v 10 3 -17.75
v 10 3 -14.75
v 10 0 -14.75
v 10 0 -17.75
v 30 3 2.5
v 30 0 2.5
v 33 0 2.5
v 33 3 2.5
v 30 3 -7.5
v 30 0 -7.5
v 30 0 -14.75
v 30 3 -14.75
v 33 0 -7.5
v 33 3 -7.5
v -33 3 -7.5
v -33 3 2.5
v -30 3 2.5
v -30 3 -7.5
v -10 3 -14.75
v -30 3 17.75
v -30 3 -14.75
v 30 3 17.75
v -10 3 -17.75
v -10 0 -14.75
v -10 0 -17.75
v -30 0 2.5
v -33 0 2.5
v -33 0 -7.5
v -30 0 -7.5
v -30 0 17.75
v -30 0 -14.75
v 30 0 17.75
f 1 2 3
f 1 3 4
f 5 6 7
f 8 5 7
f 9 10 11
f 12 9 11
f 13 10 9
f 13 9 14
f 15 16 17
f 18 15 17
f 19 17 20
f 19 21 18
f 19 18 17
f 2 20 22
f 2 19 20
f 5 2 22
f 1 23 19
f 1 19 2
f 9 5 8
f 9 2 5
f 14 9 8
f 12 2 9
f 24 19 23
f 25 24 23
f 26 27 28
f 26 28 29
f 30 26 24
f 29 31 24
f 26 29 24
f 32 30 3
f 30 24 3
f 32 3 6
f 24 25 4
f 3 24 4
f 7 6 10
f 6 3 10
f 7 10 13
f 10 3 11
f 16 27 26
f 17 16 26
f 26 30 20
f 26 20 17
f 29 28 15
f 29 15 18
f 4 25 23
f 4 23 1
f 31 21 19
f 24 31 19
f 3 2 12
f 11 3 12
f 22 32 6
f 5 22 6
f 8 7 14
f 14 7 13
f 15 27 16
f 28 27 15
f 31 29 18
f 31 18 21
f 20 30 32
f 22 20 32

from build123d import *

# Parameters (mm, degrees)
SKETCH2_W           = 60
SKETCH2_H           = 35.5
BOSS_EXTRUDE1_DEPTH = 3
SKETCH3_W           = 3
SKETCH3_H           = 10
BOSS_EXTRUDE2_DEPTH = 3
SKETCH4_W           = 20
SKETCH4_H           = 3
CUT_EXTRUDE2_DEPTH  = 3


with BuildPart() as part:
    # Sketch2 → Boss-Extrude1 (new body)
    with BuildSketch(Plane(origin=(0, 0, 0), x_dir=(1, 0, 0), z_dir=(0, 1, 0))):
        Rectangle(SKETCH2_W, SKETCH2_H)
    extrude(amount=BOSS_EXTRUDE1_DEPTH)

    # Sketch3 → Boss-Extrude2 (add)
    with BuildSketch(Plane(origin=(0, 0, 0), x_dir=(1, 0, 0), z_dir=(0, 1, 0))):
        with Locations((-31.5, 2.5)):
            Rectangle(SKETCH3_W, SKETCH3_H)
        with Locations((31.5, 2.5)):
            Rectangle(SKETCH3_W, SKETCH3_H)
    extrude(amount=BOSS_EXTRUDE2_DEPTH)

    # Sketch4 → Cut-Extrude2 (cut)
    with BuildSketch(Plane(origin=(0, 3, 0), x_dir=(1, 0, 0), z_dir=(0, 1, 0))):
        with Locations((-20, 16.25)):
            Rectangle(SKETCH4_W, SKETCH4_H)
        with Locations((20, 16.25)):
            Rectangle(SKETCH4_W, SKETCH4_H)
    extrude(amount=-CUT_EXTRUDE2_DEPTH, mode=Mode.SUBTRACT)


solid = part.part
